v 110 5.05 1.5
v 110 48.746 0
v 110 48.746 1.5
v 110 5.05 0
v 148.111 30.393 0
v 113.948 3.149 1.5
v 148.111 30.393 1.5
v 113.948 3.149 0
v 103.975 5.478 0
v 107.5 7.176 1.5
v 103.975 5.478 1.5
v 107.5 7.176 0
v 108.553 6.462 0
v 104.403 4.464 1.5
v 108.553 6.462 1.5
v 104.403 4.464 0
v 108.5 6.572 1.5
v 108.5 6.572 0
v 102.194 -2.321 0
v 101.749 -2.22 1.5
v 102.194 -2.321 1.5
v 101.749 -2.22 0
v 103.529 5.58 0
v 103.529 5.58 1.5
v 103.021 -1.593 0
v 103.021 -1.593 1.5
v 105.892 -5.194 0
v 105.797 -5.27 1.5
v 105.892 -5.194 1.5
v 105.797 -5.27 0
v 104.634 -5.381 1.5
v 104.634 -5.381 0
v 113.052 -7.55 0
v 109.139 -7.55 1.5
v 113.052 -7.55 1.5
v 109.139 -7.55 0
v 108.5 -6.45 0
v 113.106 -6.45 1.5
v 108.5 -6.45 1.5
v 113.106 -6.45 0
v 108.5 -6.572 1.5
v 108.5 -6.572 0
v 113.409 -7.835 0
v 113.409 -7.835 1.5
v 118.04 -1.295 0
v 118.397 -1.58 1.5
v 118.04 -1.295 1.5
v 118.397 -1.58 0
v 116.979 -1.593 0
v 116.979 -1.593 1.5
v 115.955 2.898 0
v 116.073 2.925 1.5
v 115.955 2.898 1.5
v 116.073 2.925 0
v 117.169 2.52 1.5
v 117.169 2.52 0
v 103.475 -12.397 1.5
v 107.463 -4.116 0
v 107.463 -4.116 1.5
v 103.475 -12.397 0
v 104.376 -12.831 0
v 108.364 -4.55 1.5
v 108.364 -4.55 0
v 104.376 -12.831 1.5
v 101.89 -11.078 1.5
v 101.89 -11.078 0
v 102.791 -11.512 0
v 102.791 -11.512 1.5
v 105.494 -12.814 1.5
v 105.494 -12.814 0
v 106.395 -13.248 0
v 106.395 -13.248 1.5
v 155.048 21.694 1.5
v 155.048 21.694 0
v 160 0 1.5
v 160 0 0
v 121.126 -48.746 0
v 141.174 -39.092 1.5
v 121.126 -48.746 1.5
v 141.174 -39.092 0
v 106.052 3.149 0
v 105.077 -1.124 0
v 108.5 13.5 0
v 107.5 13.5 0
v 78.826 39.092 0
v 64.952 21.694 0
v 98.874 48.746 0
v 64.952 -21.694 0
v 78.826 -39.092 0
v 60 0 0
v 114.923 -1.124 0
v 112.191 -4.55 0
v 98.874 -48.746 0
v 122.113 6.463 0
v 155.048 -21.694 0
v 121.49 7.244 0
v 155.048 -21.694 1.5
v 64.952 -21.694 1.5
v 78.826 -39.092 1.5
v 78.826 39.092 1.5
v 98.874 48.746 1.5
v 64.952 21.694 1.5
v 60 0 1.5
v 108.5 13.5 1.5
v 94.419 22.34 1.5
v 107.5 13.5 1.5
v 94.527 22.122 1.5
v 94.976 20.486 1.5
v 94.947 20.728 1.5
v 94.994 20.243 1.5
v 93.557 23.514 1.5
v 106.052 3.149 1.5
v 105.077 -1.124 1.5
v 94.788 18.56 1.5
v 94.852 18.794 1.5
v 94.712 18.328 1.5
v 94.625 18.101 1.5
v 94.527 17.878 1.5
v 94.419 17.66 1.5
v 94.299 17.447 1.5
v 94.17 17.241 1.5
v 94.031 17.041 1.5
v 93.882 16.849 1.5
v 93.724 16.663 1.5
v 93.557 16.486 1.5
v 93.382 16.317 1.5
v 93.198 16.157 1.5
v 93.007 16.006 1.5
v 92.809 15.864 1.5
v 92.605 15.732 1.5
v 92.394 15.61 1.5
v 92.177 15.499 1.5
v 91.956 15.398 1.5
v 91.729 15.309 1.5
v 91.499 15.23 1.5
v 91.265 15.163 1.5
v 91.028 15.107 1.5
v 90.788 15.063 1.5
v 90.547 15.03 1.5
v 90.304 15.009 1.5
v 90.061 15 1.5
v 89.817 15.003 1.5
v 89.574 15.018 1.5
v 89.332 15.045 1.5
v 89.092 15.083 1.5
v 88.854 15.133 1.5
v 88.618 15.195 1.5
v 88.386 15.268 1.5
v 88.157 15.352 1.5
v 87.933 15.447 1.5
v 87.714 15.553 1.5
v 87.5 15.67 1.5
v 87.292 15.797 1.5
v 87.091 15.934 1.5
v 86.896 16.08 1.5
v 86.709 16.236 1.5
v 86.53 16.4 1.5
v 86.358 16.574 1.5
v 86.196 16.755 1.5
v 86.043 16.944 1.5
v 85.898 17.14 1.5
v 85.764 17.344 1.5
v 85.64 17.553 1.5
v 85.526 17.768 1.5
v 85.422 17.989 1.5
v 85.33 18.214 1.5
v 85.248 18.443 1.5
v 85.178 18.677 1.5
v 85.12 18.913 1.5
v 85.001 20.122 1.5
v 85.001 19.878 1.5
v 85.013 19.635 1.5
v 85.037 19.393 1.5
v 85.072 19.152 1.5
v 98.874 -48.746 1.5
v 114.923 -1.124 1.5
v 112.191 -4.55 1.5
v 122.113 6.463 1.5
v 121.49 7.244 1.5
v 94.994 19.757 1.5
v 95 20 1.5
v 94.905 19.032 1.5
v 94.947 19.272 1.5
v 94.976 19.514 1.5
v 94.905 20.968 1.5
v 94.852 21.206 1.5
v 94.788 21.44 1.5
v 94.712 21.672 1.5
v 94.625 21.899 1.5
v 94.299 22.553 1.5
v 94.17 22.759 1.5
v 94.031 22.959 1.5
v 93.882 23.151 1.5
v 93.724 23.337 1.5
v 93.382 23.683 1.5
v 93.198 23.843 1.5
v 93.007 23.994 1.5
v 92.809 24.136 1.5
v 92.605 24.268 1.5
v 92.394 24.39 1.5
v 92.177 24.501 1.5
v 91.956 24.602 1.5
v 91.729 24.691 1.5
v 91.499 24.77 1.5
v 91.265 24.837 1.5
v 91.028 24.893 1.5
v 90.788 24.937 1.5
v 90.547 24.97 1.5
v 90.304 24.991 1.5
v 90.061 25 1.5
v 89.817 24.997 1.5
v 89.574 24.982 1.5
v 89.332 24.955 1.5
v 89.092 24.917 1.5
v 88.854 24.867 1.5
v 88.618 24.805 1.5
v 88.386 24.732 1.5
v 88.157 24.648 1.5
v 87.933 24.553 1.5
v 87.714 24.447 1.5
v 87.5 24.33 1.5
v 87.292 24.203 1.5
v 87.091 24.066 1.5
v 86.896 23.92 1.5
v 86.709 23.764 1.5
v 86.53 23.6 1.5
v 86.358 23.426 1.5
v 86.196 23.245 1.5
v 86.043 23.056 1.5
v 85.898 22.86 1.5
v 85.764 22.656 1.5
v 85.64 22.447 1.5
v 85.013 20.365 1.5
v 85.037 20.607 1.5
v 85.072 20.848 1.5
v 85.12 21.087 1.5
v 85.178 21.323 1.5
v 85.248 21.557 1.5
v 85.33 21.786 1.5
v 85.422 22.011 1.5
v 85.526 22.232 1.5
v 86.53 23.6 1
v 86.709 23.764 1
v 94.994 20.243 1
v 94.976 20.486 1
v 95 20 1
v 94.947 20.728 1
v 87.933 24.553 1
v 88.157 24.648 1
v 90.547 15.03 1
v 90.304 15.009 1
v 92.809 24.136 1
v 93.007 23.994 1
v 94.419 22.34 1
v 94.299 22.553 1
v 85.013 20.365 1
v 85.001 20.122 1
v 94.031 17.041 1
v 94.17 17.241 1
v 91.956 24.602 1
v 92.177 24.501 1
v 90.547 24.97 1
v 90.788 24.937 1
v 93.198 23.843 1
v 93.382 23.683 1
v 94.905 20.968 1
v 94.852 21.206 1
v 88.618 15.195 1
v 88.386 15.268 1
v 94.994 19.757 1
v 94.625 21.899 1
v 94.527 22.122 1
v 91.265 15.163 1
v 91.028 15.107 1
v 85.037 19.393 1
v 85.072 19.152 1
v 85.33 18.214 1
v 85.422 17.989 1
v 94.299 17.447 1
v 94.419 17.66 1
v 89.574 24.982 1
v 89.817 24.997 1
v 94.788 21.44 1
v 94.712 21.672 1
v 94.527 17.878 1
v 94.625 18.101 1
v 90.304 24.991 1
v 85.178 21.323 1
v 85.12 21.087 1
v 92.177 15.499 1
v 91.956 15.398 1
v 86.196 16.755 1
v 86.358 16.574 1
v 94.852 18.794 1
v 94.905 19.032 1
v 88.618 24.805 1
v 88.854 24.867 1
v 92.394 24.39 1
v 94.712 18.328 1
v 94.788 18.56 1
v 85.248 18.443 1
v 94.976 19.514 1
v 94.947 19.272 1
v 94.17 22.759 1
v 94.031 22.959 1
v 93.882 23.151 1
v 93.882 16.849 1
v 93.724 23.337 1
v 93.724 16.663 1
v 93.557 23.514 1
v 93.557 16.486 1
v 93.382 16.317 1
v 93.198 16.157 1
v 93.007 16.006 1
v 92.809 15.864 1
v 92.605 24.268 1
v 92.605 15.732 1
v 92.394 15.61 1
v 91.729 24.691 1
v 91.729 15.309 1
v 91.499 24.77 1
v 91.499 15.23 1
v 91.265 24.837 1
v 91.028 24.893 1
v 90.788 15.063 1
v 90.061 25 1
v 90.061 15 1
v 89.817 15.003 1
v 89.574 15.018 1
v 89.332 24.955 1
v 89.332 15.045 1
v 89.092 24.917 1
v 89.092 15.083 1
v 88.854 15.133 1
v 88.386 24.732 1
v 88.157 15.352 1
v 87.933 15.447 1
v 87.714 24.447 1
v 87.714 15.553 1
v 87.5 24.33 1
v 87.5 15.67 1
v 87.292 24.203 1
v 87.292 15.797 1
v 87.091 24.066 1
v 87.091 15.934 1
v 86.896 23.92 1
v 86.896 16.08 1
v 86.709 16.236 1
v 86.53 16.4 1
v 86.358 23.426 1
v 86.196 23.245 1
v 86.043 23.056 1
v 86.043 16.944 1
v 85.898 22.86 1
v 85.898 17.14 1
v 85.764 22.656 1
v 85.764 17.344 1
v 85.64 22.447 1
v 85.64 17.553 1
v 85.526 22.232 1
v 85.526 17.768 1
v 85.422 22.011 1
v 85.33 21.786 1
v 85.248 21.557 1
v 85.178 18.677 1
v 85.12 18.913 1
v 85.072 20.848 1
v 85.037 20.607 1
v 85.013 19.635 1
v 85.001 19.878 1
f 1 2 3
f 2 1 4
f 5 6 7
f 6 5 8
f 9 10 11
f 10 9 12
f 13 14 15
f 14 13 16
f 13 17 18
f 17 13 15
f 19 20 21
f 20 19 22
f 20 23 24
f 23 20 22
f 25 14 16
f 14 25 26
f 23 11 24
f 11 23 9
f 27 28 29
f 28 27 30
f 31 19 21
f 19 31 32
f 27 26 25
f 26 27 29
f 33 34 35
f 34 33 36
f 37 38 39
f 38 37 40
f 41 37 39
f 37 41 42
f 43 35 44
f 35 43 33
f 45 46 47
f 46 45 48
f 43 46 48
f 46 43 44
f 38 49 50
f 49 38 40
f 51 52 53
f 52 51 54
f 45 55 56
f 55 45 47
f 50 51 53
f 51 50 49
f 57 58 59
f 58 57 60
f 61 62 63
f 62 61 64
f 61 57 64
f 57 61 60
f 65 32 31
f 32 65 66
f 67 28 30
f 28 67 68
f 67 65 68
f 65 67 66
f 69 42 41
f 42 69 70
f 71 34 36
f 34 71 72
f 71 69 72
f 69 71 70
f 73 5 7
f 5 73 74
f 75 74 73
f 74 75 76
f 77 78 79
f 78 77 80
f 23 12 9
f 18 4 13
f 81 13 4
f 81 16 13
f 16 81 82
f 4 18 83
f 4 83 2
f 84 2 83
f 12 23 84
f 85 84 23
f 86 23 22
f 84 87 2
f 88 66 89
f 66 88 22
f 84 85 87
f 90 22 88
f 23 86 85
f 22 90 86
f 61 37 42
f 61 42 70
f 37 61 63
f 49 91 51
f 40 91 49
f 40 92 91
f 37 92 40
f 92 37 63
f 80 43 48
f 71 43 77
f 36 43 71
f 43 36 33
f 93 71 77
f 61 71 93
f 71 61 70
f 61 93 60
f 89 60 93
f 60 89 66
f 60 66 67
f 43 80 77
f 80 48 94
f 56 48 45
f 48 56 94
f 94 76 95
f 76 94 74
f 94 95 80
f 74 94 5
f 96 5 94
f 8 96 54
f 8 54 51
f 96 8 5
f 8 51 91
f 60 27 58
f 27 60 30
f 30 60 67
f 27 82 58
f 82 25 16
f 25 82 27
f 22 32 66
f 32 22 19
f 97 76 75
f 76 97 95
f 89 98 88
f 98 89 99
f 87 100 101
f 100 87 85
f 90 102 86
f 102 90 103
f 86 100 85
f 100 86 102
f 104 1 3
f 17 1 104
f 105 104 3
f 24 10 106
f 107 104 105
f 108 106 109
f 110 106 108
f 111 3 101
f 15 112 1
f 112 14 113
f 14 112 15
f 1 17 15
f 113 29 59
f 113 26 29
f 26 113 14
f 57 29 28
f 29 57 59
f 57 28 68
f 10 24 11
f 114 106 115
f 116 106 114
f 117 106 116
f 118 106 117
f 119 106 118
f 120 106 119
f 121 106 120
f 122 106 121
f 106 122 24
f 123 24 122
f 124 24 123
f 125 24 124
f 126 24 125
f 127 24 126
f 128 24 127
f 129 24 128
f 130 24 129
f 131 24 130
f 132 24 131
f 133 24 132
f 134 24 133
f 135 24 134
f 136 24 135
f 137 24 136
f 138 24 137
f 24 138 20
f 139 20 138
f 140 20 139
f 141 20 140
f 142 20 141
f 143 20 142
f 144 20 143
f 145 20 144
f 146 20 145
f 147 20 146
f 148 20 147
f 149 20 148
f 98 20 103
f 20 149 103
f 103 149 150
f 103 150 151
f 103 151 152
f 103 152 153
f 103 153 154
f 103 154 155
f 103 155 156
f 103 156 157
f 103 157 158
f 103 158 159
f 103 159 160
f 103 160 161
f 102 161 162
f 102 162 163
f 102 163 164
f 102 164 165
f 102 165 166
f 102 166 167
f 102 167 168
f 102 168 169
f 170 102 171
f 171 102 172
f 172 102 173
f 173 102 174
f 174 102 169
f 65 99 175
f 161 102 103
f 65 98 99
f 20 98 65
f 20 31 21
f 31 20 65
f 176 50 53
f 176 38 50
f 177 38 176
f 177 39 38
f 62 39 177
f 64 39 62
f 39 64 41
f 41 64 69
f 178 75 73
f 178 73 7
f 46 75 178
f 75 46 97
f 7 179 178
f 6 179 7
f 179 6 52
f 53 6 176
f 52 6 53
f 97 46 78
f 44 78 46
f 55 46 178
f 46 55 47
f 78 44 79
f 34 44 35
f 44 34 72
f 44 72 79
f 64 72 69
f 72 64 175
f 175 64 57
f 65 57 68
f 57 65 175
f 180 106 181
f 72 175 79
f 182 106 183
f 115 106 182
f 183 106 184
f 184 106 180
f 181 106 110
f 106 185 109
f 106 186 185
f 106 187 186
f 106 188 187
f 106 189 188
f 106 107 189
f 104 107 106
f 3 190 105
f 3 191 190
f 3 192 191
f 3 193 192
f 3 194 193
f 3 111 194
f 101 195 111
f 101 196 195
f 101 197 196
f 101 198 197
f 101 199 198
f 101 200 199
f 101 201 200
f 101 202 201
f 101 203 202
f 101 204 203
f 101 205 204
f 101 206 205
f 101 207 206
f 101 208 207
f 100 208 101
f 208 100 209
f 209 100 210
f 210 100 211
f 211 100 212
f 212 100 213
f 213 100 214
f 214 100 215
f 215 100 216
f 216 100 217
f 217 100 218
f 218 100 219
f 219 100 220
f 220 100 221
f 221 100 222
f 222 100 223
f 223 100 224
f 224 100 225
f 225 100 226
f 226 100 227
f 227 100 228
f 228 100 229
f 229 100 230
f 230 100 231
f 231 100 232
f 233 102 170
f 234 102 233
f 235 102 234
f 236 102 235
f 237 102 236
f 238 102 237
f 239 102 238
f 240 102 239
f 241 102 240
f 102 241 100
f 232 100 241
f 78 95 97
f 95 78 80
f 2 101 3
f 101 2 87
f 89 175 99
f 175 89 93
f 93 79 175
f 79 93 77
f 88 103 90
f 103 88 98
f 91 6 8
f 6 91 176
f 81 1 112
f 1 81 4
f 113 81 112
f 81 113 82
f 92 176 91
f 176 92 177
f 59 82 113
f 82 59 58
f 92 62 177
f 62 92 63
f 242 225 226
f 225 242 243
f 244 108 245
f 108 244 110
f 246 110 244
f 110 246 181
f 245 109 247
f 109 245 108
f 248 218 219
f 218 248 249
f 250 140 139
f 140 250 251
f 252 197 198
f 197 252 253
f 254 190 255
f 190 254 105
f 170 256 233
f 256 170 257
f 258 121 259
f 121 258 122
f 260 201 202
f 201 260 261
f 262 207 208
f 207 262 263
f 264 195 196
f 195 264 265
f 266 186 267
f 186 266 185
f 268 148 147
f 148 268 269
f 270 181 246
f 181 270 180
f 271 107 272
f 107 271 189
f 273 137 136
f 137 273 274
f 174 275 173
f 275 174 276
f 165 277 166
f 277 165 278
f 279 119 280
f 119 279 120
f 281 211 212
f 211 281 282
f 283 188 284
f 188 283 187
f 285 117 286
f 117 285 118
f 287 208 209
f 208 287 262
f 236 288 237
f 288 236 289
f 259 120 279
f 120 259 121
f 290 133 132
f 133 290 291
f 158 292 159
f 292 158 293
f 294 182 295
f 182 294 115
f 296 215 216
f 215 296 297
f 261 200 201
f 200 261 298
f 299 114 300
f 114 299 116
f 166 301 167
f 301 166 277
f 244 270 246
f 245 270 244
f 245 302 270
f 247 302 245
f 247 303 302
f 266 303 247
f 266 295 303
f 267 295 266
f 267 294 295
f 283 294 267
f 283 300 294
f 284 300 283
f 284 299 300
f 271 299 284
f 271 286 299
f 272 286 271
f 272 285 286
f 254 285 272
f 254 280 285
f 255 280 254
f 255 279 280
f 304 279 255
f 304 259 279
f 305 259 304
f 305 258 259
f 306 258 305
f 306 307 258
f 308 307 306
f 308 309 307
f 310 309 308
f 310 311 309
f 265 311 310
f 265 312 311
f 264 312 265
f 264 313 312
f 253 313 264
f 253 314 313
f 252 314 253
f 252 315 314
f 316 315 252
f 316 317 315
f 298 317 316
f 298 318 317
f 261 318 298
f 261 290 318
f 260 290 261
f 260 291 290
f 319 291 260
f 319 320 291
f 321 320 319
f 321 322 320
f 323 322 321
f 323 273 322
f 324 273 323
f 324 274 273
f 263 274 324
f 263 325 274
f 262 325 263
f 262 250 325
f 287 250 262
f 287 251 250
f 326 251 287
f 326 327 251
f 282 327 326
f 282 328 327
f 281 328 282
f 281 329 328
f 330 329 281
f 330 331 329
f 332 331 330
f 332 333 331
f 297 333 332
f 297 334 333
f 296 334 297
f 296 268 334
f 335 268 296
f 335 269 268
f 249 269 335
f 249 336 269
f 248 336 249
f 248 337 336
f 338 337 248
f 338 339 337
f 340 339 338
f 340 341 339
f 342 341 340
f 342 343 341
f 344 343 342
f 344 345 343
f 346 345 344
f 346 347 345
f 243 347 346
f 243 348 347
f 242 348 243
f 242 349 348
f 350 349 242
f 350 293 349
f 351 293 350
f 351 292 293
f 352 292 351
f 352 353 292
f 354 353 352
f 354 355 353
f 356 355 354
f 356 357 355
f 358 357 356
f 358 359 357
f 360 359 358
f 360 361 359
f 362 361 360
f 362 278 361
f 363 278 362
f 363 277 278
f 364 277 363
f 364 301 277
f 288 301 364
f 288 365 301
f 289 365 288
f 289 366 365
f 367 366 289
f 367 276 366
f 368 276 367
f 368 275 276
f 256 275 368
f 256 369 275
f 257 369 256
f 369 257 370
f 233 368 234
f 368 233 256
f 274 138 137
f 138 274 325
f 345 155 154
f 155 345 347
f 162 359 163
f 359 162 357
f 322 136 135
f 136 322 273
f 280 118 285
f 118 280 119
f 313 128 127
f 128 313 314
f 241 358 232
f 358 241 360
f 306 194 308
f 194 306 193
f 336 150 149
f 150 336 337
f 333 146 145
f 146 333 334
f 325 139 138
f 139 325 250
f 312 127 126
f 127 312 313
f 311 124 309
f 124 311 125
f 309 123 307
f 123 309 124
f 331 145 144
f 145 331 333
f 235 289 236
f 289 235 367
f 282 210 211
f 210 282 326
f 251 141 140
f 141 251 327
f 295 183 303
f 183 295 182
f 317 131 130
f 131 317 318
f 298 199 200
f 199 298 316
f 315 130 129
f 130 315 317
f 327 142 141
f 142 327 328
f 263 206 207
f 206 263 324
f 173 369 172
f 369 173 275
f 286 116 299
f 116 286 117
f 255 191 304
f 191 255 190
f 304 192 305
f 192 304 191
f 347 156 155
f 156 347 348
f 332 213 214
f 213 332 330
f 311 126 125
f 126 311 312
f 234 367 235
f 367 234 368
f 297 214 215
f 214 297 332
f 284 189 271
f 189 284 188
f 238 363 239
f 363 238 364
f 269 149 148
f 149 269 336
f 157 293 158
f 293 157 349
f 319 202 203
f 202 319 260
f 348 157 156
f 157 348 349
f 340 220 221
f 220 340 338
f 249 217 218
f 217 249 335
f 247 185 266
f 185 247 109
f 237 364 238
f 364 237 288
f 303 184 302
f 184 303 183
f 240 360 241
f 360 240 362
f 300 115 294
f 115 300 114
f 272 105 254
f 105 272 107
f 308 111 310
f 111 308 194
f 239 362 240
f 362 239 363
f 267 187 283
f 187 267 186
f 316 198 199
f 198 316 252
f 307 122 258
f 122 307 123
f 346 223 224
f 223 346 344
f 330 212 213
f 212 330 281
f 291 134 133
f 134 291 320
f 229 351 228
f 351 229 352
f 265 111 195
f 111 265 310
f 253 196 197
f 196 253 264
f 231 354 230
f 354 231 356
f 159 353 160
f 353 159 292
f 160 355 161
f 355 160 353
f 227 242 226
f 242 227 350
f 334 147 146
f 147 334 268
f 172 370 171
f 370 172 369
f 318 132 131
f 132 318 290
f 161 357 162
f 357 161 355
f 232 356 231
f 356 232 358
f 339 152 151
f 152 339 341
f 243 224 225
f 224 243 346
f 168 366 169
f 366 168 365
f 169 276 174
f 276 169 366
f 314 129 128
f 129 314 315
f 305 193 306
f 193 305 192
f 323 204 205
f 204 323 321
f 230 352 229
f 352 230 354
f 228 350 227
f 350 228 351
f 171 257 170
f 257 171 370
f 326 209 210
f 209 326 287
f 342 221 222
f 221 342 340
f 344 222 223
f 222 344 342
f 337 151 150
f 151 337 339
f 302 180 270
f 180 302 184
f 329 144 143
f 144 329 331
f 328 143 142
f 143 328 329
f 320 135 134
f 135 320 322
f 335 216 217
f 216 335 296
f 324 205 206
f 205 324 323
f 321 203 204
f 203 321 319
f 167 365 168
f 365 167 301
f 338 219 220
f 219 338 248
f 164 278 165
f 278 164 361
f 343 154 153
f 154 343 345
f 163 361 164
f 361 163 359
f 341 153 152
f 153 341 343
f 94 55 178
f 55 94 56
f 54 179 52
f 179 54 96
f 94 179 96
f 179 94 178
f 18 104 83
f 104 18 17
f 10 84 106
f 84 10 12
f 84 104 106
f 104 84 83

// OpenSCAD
/*union(){
    difference(){
        cylinder(d=100,h=20, $fn=2*7);
        translate([0,0,1])
            cylinder(d=100-3,h=20, $fn=2*7);
    }


    dow = [
    "Ma",
    "Di",
    "Wo",
    "Do",
    "Vr",
    "Za",
    "Zo",
    ];

    for(i=[0:6])
    {
        rotate([0,0,i*360/7])
        {
            translate([-0.5,0,0.5])
                cube([1,48,19]);
            translate([0,-40,0.1])
                linear_extrude(1.5)
                    text(dow[i],halign="center");
            
            translate([0,-47.5,5])
                rotate([90,0,0])
                    linear_extrude(1.5)        
                        text(dow[i],halign="center");
        }     
    }
    rotate([0,0,-360/28])
        cylinder(d=10, h=25, $fn=7);
}*/
translate([110,0,0])
{
    difference()
    {
        cylinder(d=100, h=1.5, $fn=14);  
        rotate([0,0,-360/28])          
            cylinder(d=10.1, h=25, $fn=7, center=true);
        translate([0,0,-1])
        difference()
        {
            cube(70);
            rotate([0,0,-360/7])                
            cube(80);
        }
        //eye
        translate([-20,20,1])
            cylinder(d=10,h=4,$fn=129);
        
        l=[0,5,8,5,5,8,5];
        o=[0,-1,0,1,-1,0,1];
        // cut out
        for(i=[1:6])
        {
            rotate([0,0,i*360/7-360/14])
            {
                translate([o[i],7,0])
                    cube([l[i],1.1,9], center=true);
            }     
        }
        rotate([0,0,3*360/7])
        {
            translate([0,7,0])
                cube([1,14,9], center=true);
            translate([2,10,0])
                cube([1,7,9], center=true);
            translate([-2,10,0])
                cube([1,7,9], center=true);
        }  
        rotate([0,0,6*360/7])
        { 
            translate([2,10,0])
                cube([1,7,9], center=true); 
        }  
        
        rotate([0,0,0*360/7])
        { 
            translate([-2,10,0])
                cube([1,7,9], center=true); 
        }  
    }
}
